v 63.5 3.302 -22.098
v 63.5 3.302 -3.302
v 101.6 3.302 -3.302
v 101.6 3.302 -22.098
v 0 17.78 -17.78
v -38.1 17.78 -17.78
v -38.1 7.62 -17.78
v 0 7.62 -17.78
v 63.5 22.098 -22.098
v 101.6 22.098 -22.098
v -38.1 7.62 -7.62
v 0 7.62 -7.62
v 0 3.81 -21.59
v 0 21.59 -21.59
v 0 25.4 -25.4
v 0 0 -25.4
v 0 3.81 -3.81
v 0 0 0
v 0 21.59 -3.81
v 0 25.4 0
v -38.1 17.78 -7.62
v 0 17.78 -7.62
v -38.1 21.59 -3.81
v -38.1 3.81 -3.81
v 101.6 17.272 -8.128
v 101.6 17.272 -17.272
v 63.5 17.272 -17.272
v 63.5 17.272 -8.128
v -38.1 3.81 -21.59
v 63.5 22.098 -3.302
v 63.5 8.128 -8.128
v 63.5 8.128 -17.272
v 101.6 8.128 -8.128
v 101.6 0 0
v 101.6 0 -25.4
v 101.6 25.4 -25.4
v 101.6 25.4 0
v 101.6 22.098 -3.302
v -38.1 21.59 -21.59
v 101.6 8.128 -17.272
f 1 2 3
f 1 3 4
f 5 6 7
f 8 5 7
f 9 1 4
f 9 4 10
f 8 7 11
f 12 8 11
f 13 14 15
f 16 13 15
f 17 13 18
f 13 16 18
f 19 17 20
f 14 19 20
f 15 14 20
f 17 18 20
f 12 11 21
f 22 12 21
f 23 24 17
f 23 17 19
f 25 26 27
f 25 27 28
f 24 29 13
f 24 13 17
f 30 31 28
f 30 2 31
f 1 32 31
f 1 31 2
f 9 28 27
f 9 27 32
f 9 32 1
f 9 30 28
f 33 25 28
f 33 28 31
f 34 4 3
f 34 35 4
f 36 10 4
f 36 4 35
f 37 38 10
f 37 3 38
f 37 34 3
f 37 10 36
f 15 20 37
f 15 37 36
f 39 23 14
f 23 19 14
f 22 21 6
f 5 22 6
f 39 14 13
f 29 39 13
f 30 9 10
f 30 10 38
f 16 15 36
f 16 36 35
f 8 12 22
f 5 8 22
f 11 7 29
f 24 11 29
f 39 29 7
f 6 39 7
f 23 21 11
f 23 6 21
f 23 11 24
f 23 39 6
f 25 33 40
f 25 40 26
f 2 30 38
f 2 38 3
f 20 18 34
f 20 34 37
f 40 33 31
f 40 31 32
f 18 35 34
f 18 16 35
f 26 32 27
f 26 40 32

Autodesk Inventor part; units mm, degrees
ref_plane "YZ Plane" through (0, 0, 0) normal (1, 0, 0) x (0, 1, 0)
ref_plane "XZ Plane" through (0, 0, 0) normal (0, 1, 0) x (-1, 0, 0)
ref_plane "XY Plane" through (0, 0, 0) normal (0, 0, 1) x (1, 0, 0)
sketch "Sketch1" plane through (0, 0, 0) normal (1, 0, 0) x (0, 1, 0)
  line L0 (0, 0) -> (25.4, 0)
  line L1 (25.4, 0) -> (25.4, -25.4)
  line L2 (25.4, -25.4) -> (0, -25.4)
  line L3 (0, -25.4) -> (0, 0)
  dimension "d0" = 25.4
  dimension "d1" = 25.4
extrude "Extrusion1" add sketch "Sketch1" along normal blind 101.6
sketch "Sketch2" plane through (0, 0, 0) normal (-1, 0, 0) x (0, 0, 1)
  line L0 (-25.4, 0) -> (-25.4, 25.4) projected
  line L1 (-25.4, 0) -> (-21.59, 0)
  line L2 (-21.59, 3.81) -> (-17.78, 3.81)
  line L3 (-21.59, 7.62) -> (-21.59, 3.81)
  line L4 (-3.81, 21.59) -> (-7.62, 21.59)
  line L5 (-3.81, 17.78) -> (-3.81, 21.59)
  line L6 (-21.59, 3.81) -> (-3.81, 3.81)
  line L7 (-3.81, 3.81) -> (-3.81, 21.59)
  line L8 (-3.81, 21.59) -> (-21.59, 21.59)
  line L9 (-21.59, 21.59) -> (-21.59, 3.81)
  line L10 (-17.78, 7.62) -> (-7.62, 7.62)
  line L11 (-7.62, 7.62) -> (-7.62, 17.78)
  line L12 (-7.62, 17.78) -> (-17.78, 17.78)
  line L13 (-17.78, 17.78) -> (-17.78, 7.62)
  point P0 (0, 0)
  point P1 (0, 25.4)
extrude "Extrusion2" add sketch "Sketch2" along normal blind 38.1
sketch "Sketch3" plane through (101.6, 0, 0) normal (1, 0, 0) x (0, 0, -1)
  line L0 (0, 25.4) -> (0, 0) projected
  line L1 (25.4, 25.4) -> (0, 25.4) projected
  line L2 (3.302, 3.81) -> (3.302, 3.302)
  line L3 (3.302, 3.302) -> (3.81, 3.302)
  line L4 (3.302, 3.302) -> (22.098, 3.302)
  line L5 (22.098, 3.302) -> (22.098, 22.098)
  line L6 (22.098, 22.098) -> (3.302, 22.098)
  line L7 (3.302, 22.098) -> (3.302, 3.302)
  line L8 (8.128, 8.128) -> (17.272, 8.128)
  line L9 (17.272, 8.128) -> (17.272, 17.272)
  line L10 (17.272, 17.272) -> (8.128, 17.272)
  line L11 (8.128, 17.272) -> (8.128, 8.128)
  dimension "d32" = 0.508
  dimension "d33" = 0.508
extrude "Extrusion3" cut sketch "Sketch3" against normal blind 38.1
properties part number "Center Piece"
